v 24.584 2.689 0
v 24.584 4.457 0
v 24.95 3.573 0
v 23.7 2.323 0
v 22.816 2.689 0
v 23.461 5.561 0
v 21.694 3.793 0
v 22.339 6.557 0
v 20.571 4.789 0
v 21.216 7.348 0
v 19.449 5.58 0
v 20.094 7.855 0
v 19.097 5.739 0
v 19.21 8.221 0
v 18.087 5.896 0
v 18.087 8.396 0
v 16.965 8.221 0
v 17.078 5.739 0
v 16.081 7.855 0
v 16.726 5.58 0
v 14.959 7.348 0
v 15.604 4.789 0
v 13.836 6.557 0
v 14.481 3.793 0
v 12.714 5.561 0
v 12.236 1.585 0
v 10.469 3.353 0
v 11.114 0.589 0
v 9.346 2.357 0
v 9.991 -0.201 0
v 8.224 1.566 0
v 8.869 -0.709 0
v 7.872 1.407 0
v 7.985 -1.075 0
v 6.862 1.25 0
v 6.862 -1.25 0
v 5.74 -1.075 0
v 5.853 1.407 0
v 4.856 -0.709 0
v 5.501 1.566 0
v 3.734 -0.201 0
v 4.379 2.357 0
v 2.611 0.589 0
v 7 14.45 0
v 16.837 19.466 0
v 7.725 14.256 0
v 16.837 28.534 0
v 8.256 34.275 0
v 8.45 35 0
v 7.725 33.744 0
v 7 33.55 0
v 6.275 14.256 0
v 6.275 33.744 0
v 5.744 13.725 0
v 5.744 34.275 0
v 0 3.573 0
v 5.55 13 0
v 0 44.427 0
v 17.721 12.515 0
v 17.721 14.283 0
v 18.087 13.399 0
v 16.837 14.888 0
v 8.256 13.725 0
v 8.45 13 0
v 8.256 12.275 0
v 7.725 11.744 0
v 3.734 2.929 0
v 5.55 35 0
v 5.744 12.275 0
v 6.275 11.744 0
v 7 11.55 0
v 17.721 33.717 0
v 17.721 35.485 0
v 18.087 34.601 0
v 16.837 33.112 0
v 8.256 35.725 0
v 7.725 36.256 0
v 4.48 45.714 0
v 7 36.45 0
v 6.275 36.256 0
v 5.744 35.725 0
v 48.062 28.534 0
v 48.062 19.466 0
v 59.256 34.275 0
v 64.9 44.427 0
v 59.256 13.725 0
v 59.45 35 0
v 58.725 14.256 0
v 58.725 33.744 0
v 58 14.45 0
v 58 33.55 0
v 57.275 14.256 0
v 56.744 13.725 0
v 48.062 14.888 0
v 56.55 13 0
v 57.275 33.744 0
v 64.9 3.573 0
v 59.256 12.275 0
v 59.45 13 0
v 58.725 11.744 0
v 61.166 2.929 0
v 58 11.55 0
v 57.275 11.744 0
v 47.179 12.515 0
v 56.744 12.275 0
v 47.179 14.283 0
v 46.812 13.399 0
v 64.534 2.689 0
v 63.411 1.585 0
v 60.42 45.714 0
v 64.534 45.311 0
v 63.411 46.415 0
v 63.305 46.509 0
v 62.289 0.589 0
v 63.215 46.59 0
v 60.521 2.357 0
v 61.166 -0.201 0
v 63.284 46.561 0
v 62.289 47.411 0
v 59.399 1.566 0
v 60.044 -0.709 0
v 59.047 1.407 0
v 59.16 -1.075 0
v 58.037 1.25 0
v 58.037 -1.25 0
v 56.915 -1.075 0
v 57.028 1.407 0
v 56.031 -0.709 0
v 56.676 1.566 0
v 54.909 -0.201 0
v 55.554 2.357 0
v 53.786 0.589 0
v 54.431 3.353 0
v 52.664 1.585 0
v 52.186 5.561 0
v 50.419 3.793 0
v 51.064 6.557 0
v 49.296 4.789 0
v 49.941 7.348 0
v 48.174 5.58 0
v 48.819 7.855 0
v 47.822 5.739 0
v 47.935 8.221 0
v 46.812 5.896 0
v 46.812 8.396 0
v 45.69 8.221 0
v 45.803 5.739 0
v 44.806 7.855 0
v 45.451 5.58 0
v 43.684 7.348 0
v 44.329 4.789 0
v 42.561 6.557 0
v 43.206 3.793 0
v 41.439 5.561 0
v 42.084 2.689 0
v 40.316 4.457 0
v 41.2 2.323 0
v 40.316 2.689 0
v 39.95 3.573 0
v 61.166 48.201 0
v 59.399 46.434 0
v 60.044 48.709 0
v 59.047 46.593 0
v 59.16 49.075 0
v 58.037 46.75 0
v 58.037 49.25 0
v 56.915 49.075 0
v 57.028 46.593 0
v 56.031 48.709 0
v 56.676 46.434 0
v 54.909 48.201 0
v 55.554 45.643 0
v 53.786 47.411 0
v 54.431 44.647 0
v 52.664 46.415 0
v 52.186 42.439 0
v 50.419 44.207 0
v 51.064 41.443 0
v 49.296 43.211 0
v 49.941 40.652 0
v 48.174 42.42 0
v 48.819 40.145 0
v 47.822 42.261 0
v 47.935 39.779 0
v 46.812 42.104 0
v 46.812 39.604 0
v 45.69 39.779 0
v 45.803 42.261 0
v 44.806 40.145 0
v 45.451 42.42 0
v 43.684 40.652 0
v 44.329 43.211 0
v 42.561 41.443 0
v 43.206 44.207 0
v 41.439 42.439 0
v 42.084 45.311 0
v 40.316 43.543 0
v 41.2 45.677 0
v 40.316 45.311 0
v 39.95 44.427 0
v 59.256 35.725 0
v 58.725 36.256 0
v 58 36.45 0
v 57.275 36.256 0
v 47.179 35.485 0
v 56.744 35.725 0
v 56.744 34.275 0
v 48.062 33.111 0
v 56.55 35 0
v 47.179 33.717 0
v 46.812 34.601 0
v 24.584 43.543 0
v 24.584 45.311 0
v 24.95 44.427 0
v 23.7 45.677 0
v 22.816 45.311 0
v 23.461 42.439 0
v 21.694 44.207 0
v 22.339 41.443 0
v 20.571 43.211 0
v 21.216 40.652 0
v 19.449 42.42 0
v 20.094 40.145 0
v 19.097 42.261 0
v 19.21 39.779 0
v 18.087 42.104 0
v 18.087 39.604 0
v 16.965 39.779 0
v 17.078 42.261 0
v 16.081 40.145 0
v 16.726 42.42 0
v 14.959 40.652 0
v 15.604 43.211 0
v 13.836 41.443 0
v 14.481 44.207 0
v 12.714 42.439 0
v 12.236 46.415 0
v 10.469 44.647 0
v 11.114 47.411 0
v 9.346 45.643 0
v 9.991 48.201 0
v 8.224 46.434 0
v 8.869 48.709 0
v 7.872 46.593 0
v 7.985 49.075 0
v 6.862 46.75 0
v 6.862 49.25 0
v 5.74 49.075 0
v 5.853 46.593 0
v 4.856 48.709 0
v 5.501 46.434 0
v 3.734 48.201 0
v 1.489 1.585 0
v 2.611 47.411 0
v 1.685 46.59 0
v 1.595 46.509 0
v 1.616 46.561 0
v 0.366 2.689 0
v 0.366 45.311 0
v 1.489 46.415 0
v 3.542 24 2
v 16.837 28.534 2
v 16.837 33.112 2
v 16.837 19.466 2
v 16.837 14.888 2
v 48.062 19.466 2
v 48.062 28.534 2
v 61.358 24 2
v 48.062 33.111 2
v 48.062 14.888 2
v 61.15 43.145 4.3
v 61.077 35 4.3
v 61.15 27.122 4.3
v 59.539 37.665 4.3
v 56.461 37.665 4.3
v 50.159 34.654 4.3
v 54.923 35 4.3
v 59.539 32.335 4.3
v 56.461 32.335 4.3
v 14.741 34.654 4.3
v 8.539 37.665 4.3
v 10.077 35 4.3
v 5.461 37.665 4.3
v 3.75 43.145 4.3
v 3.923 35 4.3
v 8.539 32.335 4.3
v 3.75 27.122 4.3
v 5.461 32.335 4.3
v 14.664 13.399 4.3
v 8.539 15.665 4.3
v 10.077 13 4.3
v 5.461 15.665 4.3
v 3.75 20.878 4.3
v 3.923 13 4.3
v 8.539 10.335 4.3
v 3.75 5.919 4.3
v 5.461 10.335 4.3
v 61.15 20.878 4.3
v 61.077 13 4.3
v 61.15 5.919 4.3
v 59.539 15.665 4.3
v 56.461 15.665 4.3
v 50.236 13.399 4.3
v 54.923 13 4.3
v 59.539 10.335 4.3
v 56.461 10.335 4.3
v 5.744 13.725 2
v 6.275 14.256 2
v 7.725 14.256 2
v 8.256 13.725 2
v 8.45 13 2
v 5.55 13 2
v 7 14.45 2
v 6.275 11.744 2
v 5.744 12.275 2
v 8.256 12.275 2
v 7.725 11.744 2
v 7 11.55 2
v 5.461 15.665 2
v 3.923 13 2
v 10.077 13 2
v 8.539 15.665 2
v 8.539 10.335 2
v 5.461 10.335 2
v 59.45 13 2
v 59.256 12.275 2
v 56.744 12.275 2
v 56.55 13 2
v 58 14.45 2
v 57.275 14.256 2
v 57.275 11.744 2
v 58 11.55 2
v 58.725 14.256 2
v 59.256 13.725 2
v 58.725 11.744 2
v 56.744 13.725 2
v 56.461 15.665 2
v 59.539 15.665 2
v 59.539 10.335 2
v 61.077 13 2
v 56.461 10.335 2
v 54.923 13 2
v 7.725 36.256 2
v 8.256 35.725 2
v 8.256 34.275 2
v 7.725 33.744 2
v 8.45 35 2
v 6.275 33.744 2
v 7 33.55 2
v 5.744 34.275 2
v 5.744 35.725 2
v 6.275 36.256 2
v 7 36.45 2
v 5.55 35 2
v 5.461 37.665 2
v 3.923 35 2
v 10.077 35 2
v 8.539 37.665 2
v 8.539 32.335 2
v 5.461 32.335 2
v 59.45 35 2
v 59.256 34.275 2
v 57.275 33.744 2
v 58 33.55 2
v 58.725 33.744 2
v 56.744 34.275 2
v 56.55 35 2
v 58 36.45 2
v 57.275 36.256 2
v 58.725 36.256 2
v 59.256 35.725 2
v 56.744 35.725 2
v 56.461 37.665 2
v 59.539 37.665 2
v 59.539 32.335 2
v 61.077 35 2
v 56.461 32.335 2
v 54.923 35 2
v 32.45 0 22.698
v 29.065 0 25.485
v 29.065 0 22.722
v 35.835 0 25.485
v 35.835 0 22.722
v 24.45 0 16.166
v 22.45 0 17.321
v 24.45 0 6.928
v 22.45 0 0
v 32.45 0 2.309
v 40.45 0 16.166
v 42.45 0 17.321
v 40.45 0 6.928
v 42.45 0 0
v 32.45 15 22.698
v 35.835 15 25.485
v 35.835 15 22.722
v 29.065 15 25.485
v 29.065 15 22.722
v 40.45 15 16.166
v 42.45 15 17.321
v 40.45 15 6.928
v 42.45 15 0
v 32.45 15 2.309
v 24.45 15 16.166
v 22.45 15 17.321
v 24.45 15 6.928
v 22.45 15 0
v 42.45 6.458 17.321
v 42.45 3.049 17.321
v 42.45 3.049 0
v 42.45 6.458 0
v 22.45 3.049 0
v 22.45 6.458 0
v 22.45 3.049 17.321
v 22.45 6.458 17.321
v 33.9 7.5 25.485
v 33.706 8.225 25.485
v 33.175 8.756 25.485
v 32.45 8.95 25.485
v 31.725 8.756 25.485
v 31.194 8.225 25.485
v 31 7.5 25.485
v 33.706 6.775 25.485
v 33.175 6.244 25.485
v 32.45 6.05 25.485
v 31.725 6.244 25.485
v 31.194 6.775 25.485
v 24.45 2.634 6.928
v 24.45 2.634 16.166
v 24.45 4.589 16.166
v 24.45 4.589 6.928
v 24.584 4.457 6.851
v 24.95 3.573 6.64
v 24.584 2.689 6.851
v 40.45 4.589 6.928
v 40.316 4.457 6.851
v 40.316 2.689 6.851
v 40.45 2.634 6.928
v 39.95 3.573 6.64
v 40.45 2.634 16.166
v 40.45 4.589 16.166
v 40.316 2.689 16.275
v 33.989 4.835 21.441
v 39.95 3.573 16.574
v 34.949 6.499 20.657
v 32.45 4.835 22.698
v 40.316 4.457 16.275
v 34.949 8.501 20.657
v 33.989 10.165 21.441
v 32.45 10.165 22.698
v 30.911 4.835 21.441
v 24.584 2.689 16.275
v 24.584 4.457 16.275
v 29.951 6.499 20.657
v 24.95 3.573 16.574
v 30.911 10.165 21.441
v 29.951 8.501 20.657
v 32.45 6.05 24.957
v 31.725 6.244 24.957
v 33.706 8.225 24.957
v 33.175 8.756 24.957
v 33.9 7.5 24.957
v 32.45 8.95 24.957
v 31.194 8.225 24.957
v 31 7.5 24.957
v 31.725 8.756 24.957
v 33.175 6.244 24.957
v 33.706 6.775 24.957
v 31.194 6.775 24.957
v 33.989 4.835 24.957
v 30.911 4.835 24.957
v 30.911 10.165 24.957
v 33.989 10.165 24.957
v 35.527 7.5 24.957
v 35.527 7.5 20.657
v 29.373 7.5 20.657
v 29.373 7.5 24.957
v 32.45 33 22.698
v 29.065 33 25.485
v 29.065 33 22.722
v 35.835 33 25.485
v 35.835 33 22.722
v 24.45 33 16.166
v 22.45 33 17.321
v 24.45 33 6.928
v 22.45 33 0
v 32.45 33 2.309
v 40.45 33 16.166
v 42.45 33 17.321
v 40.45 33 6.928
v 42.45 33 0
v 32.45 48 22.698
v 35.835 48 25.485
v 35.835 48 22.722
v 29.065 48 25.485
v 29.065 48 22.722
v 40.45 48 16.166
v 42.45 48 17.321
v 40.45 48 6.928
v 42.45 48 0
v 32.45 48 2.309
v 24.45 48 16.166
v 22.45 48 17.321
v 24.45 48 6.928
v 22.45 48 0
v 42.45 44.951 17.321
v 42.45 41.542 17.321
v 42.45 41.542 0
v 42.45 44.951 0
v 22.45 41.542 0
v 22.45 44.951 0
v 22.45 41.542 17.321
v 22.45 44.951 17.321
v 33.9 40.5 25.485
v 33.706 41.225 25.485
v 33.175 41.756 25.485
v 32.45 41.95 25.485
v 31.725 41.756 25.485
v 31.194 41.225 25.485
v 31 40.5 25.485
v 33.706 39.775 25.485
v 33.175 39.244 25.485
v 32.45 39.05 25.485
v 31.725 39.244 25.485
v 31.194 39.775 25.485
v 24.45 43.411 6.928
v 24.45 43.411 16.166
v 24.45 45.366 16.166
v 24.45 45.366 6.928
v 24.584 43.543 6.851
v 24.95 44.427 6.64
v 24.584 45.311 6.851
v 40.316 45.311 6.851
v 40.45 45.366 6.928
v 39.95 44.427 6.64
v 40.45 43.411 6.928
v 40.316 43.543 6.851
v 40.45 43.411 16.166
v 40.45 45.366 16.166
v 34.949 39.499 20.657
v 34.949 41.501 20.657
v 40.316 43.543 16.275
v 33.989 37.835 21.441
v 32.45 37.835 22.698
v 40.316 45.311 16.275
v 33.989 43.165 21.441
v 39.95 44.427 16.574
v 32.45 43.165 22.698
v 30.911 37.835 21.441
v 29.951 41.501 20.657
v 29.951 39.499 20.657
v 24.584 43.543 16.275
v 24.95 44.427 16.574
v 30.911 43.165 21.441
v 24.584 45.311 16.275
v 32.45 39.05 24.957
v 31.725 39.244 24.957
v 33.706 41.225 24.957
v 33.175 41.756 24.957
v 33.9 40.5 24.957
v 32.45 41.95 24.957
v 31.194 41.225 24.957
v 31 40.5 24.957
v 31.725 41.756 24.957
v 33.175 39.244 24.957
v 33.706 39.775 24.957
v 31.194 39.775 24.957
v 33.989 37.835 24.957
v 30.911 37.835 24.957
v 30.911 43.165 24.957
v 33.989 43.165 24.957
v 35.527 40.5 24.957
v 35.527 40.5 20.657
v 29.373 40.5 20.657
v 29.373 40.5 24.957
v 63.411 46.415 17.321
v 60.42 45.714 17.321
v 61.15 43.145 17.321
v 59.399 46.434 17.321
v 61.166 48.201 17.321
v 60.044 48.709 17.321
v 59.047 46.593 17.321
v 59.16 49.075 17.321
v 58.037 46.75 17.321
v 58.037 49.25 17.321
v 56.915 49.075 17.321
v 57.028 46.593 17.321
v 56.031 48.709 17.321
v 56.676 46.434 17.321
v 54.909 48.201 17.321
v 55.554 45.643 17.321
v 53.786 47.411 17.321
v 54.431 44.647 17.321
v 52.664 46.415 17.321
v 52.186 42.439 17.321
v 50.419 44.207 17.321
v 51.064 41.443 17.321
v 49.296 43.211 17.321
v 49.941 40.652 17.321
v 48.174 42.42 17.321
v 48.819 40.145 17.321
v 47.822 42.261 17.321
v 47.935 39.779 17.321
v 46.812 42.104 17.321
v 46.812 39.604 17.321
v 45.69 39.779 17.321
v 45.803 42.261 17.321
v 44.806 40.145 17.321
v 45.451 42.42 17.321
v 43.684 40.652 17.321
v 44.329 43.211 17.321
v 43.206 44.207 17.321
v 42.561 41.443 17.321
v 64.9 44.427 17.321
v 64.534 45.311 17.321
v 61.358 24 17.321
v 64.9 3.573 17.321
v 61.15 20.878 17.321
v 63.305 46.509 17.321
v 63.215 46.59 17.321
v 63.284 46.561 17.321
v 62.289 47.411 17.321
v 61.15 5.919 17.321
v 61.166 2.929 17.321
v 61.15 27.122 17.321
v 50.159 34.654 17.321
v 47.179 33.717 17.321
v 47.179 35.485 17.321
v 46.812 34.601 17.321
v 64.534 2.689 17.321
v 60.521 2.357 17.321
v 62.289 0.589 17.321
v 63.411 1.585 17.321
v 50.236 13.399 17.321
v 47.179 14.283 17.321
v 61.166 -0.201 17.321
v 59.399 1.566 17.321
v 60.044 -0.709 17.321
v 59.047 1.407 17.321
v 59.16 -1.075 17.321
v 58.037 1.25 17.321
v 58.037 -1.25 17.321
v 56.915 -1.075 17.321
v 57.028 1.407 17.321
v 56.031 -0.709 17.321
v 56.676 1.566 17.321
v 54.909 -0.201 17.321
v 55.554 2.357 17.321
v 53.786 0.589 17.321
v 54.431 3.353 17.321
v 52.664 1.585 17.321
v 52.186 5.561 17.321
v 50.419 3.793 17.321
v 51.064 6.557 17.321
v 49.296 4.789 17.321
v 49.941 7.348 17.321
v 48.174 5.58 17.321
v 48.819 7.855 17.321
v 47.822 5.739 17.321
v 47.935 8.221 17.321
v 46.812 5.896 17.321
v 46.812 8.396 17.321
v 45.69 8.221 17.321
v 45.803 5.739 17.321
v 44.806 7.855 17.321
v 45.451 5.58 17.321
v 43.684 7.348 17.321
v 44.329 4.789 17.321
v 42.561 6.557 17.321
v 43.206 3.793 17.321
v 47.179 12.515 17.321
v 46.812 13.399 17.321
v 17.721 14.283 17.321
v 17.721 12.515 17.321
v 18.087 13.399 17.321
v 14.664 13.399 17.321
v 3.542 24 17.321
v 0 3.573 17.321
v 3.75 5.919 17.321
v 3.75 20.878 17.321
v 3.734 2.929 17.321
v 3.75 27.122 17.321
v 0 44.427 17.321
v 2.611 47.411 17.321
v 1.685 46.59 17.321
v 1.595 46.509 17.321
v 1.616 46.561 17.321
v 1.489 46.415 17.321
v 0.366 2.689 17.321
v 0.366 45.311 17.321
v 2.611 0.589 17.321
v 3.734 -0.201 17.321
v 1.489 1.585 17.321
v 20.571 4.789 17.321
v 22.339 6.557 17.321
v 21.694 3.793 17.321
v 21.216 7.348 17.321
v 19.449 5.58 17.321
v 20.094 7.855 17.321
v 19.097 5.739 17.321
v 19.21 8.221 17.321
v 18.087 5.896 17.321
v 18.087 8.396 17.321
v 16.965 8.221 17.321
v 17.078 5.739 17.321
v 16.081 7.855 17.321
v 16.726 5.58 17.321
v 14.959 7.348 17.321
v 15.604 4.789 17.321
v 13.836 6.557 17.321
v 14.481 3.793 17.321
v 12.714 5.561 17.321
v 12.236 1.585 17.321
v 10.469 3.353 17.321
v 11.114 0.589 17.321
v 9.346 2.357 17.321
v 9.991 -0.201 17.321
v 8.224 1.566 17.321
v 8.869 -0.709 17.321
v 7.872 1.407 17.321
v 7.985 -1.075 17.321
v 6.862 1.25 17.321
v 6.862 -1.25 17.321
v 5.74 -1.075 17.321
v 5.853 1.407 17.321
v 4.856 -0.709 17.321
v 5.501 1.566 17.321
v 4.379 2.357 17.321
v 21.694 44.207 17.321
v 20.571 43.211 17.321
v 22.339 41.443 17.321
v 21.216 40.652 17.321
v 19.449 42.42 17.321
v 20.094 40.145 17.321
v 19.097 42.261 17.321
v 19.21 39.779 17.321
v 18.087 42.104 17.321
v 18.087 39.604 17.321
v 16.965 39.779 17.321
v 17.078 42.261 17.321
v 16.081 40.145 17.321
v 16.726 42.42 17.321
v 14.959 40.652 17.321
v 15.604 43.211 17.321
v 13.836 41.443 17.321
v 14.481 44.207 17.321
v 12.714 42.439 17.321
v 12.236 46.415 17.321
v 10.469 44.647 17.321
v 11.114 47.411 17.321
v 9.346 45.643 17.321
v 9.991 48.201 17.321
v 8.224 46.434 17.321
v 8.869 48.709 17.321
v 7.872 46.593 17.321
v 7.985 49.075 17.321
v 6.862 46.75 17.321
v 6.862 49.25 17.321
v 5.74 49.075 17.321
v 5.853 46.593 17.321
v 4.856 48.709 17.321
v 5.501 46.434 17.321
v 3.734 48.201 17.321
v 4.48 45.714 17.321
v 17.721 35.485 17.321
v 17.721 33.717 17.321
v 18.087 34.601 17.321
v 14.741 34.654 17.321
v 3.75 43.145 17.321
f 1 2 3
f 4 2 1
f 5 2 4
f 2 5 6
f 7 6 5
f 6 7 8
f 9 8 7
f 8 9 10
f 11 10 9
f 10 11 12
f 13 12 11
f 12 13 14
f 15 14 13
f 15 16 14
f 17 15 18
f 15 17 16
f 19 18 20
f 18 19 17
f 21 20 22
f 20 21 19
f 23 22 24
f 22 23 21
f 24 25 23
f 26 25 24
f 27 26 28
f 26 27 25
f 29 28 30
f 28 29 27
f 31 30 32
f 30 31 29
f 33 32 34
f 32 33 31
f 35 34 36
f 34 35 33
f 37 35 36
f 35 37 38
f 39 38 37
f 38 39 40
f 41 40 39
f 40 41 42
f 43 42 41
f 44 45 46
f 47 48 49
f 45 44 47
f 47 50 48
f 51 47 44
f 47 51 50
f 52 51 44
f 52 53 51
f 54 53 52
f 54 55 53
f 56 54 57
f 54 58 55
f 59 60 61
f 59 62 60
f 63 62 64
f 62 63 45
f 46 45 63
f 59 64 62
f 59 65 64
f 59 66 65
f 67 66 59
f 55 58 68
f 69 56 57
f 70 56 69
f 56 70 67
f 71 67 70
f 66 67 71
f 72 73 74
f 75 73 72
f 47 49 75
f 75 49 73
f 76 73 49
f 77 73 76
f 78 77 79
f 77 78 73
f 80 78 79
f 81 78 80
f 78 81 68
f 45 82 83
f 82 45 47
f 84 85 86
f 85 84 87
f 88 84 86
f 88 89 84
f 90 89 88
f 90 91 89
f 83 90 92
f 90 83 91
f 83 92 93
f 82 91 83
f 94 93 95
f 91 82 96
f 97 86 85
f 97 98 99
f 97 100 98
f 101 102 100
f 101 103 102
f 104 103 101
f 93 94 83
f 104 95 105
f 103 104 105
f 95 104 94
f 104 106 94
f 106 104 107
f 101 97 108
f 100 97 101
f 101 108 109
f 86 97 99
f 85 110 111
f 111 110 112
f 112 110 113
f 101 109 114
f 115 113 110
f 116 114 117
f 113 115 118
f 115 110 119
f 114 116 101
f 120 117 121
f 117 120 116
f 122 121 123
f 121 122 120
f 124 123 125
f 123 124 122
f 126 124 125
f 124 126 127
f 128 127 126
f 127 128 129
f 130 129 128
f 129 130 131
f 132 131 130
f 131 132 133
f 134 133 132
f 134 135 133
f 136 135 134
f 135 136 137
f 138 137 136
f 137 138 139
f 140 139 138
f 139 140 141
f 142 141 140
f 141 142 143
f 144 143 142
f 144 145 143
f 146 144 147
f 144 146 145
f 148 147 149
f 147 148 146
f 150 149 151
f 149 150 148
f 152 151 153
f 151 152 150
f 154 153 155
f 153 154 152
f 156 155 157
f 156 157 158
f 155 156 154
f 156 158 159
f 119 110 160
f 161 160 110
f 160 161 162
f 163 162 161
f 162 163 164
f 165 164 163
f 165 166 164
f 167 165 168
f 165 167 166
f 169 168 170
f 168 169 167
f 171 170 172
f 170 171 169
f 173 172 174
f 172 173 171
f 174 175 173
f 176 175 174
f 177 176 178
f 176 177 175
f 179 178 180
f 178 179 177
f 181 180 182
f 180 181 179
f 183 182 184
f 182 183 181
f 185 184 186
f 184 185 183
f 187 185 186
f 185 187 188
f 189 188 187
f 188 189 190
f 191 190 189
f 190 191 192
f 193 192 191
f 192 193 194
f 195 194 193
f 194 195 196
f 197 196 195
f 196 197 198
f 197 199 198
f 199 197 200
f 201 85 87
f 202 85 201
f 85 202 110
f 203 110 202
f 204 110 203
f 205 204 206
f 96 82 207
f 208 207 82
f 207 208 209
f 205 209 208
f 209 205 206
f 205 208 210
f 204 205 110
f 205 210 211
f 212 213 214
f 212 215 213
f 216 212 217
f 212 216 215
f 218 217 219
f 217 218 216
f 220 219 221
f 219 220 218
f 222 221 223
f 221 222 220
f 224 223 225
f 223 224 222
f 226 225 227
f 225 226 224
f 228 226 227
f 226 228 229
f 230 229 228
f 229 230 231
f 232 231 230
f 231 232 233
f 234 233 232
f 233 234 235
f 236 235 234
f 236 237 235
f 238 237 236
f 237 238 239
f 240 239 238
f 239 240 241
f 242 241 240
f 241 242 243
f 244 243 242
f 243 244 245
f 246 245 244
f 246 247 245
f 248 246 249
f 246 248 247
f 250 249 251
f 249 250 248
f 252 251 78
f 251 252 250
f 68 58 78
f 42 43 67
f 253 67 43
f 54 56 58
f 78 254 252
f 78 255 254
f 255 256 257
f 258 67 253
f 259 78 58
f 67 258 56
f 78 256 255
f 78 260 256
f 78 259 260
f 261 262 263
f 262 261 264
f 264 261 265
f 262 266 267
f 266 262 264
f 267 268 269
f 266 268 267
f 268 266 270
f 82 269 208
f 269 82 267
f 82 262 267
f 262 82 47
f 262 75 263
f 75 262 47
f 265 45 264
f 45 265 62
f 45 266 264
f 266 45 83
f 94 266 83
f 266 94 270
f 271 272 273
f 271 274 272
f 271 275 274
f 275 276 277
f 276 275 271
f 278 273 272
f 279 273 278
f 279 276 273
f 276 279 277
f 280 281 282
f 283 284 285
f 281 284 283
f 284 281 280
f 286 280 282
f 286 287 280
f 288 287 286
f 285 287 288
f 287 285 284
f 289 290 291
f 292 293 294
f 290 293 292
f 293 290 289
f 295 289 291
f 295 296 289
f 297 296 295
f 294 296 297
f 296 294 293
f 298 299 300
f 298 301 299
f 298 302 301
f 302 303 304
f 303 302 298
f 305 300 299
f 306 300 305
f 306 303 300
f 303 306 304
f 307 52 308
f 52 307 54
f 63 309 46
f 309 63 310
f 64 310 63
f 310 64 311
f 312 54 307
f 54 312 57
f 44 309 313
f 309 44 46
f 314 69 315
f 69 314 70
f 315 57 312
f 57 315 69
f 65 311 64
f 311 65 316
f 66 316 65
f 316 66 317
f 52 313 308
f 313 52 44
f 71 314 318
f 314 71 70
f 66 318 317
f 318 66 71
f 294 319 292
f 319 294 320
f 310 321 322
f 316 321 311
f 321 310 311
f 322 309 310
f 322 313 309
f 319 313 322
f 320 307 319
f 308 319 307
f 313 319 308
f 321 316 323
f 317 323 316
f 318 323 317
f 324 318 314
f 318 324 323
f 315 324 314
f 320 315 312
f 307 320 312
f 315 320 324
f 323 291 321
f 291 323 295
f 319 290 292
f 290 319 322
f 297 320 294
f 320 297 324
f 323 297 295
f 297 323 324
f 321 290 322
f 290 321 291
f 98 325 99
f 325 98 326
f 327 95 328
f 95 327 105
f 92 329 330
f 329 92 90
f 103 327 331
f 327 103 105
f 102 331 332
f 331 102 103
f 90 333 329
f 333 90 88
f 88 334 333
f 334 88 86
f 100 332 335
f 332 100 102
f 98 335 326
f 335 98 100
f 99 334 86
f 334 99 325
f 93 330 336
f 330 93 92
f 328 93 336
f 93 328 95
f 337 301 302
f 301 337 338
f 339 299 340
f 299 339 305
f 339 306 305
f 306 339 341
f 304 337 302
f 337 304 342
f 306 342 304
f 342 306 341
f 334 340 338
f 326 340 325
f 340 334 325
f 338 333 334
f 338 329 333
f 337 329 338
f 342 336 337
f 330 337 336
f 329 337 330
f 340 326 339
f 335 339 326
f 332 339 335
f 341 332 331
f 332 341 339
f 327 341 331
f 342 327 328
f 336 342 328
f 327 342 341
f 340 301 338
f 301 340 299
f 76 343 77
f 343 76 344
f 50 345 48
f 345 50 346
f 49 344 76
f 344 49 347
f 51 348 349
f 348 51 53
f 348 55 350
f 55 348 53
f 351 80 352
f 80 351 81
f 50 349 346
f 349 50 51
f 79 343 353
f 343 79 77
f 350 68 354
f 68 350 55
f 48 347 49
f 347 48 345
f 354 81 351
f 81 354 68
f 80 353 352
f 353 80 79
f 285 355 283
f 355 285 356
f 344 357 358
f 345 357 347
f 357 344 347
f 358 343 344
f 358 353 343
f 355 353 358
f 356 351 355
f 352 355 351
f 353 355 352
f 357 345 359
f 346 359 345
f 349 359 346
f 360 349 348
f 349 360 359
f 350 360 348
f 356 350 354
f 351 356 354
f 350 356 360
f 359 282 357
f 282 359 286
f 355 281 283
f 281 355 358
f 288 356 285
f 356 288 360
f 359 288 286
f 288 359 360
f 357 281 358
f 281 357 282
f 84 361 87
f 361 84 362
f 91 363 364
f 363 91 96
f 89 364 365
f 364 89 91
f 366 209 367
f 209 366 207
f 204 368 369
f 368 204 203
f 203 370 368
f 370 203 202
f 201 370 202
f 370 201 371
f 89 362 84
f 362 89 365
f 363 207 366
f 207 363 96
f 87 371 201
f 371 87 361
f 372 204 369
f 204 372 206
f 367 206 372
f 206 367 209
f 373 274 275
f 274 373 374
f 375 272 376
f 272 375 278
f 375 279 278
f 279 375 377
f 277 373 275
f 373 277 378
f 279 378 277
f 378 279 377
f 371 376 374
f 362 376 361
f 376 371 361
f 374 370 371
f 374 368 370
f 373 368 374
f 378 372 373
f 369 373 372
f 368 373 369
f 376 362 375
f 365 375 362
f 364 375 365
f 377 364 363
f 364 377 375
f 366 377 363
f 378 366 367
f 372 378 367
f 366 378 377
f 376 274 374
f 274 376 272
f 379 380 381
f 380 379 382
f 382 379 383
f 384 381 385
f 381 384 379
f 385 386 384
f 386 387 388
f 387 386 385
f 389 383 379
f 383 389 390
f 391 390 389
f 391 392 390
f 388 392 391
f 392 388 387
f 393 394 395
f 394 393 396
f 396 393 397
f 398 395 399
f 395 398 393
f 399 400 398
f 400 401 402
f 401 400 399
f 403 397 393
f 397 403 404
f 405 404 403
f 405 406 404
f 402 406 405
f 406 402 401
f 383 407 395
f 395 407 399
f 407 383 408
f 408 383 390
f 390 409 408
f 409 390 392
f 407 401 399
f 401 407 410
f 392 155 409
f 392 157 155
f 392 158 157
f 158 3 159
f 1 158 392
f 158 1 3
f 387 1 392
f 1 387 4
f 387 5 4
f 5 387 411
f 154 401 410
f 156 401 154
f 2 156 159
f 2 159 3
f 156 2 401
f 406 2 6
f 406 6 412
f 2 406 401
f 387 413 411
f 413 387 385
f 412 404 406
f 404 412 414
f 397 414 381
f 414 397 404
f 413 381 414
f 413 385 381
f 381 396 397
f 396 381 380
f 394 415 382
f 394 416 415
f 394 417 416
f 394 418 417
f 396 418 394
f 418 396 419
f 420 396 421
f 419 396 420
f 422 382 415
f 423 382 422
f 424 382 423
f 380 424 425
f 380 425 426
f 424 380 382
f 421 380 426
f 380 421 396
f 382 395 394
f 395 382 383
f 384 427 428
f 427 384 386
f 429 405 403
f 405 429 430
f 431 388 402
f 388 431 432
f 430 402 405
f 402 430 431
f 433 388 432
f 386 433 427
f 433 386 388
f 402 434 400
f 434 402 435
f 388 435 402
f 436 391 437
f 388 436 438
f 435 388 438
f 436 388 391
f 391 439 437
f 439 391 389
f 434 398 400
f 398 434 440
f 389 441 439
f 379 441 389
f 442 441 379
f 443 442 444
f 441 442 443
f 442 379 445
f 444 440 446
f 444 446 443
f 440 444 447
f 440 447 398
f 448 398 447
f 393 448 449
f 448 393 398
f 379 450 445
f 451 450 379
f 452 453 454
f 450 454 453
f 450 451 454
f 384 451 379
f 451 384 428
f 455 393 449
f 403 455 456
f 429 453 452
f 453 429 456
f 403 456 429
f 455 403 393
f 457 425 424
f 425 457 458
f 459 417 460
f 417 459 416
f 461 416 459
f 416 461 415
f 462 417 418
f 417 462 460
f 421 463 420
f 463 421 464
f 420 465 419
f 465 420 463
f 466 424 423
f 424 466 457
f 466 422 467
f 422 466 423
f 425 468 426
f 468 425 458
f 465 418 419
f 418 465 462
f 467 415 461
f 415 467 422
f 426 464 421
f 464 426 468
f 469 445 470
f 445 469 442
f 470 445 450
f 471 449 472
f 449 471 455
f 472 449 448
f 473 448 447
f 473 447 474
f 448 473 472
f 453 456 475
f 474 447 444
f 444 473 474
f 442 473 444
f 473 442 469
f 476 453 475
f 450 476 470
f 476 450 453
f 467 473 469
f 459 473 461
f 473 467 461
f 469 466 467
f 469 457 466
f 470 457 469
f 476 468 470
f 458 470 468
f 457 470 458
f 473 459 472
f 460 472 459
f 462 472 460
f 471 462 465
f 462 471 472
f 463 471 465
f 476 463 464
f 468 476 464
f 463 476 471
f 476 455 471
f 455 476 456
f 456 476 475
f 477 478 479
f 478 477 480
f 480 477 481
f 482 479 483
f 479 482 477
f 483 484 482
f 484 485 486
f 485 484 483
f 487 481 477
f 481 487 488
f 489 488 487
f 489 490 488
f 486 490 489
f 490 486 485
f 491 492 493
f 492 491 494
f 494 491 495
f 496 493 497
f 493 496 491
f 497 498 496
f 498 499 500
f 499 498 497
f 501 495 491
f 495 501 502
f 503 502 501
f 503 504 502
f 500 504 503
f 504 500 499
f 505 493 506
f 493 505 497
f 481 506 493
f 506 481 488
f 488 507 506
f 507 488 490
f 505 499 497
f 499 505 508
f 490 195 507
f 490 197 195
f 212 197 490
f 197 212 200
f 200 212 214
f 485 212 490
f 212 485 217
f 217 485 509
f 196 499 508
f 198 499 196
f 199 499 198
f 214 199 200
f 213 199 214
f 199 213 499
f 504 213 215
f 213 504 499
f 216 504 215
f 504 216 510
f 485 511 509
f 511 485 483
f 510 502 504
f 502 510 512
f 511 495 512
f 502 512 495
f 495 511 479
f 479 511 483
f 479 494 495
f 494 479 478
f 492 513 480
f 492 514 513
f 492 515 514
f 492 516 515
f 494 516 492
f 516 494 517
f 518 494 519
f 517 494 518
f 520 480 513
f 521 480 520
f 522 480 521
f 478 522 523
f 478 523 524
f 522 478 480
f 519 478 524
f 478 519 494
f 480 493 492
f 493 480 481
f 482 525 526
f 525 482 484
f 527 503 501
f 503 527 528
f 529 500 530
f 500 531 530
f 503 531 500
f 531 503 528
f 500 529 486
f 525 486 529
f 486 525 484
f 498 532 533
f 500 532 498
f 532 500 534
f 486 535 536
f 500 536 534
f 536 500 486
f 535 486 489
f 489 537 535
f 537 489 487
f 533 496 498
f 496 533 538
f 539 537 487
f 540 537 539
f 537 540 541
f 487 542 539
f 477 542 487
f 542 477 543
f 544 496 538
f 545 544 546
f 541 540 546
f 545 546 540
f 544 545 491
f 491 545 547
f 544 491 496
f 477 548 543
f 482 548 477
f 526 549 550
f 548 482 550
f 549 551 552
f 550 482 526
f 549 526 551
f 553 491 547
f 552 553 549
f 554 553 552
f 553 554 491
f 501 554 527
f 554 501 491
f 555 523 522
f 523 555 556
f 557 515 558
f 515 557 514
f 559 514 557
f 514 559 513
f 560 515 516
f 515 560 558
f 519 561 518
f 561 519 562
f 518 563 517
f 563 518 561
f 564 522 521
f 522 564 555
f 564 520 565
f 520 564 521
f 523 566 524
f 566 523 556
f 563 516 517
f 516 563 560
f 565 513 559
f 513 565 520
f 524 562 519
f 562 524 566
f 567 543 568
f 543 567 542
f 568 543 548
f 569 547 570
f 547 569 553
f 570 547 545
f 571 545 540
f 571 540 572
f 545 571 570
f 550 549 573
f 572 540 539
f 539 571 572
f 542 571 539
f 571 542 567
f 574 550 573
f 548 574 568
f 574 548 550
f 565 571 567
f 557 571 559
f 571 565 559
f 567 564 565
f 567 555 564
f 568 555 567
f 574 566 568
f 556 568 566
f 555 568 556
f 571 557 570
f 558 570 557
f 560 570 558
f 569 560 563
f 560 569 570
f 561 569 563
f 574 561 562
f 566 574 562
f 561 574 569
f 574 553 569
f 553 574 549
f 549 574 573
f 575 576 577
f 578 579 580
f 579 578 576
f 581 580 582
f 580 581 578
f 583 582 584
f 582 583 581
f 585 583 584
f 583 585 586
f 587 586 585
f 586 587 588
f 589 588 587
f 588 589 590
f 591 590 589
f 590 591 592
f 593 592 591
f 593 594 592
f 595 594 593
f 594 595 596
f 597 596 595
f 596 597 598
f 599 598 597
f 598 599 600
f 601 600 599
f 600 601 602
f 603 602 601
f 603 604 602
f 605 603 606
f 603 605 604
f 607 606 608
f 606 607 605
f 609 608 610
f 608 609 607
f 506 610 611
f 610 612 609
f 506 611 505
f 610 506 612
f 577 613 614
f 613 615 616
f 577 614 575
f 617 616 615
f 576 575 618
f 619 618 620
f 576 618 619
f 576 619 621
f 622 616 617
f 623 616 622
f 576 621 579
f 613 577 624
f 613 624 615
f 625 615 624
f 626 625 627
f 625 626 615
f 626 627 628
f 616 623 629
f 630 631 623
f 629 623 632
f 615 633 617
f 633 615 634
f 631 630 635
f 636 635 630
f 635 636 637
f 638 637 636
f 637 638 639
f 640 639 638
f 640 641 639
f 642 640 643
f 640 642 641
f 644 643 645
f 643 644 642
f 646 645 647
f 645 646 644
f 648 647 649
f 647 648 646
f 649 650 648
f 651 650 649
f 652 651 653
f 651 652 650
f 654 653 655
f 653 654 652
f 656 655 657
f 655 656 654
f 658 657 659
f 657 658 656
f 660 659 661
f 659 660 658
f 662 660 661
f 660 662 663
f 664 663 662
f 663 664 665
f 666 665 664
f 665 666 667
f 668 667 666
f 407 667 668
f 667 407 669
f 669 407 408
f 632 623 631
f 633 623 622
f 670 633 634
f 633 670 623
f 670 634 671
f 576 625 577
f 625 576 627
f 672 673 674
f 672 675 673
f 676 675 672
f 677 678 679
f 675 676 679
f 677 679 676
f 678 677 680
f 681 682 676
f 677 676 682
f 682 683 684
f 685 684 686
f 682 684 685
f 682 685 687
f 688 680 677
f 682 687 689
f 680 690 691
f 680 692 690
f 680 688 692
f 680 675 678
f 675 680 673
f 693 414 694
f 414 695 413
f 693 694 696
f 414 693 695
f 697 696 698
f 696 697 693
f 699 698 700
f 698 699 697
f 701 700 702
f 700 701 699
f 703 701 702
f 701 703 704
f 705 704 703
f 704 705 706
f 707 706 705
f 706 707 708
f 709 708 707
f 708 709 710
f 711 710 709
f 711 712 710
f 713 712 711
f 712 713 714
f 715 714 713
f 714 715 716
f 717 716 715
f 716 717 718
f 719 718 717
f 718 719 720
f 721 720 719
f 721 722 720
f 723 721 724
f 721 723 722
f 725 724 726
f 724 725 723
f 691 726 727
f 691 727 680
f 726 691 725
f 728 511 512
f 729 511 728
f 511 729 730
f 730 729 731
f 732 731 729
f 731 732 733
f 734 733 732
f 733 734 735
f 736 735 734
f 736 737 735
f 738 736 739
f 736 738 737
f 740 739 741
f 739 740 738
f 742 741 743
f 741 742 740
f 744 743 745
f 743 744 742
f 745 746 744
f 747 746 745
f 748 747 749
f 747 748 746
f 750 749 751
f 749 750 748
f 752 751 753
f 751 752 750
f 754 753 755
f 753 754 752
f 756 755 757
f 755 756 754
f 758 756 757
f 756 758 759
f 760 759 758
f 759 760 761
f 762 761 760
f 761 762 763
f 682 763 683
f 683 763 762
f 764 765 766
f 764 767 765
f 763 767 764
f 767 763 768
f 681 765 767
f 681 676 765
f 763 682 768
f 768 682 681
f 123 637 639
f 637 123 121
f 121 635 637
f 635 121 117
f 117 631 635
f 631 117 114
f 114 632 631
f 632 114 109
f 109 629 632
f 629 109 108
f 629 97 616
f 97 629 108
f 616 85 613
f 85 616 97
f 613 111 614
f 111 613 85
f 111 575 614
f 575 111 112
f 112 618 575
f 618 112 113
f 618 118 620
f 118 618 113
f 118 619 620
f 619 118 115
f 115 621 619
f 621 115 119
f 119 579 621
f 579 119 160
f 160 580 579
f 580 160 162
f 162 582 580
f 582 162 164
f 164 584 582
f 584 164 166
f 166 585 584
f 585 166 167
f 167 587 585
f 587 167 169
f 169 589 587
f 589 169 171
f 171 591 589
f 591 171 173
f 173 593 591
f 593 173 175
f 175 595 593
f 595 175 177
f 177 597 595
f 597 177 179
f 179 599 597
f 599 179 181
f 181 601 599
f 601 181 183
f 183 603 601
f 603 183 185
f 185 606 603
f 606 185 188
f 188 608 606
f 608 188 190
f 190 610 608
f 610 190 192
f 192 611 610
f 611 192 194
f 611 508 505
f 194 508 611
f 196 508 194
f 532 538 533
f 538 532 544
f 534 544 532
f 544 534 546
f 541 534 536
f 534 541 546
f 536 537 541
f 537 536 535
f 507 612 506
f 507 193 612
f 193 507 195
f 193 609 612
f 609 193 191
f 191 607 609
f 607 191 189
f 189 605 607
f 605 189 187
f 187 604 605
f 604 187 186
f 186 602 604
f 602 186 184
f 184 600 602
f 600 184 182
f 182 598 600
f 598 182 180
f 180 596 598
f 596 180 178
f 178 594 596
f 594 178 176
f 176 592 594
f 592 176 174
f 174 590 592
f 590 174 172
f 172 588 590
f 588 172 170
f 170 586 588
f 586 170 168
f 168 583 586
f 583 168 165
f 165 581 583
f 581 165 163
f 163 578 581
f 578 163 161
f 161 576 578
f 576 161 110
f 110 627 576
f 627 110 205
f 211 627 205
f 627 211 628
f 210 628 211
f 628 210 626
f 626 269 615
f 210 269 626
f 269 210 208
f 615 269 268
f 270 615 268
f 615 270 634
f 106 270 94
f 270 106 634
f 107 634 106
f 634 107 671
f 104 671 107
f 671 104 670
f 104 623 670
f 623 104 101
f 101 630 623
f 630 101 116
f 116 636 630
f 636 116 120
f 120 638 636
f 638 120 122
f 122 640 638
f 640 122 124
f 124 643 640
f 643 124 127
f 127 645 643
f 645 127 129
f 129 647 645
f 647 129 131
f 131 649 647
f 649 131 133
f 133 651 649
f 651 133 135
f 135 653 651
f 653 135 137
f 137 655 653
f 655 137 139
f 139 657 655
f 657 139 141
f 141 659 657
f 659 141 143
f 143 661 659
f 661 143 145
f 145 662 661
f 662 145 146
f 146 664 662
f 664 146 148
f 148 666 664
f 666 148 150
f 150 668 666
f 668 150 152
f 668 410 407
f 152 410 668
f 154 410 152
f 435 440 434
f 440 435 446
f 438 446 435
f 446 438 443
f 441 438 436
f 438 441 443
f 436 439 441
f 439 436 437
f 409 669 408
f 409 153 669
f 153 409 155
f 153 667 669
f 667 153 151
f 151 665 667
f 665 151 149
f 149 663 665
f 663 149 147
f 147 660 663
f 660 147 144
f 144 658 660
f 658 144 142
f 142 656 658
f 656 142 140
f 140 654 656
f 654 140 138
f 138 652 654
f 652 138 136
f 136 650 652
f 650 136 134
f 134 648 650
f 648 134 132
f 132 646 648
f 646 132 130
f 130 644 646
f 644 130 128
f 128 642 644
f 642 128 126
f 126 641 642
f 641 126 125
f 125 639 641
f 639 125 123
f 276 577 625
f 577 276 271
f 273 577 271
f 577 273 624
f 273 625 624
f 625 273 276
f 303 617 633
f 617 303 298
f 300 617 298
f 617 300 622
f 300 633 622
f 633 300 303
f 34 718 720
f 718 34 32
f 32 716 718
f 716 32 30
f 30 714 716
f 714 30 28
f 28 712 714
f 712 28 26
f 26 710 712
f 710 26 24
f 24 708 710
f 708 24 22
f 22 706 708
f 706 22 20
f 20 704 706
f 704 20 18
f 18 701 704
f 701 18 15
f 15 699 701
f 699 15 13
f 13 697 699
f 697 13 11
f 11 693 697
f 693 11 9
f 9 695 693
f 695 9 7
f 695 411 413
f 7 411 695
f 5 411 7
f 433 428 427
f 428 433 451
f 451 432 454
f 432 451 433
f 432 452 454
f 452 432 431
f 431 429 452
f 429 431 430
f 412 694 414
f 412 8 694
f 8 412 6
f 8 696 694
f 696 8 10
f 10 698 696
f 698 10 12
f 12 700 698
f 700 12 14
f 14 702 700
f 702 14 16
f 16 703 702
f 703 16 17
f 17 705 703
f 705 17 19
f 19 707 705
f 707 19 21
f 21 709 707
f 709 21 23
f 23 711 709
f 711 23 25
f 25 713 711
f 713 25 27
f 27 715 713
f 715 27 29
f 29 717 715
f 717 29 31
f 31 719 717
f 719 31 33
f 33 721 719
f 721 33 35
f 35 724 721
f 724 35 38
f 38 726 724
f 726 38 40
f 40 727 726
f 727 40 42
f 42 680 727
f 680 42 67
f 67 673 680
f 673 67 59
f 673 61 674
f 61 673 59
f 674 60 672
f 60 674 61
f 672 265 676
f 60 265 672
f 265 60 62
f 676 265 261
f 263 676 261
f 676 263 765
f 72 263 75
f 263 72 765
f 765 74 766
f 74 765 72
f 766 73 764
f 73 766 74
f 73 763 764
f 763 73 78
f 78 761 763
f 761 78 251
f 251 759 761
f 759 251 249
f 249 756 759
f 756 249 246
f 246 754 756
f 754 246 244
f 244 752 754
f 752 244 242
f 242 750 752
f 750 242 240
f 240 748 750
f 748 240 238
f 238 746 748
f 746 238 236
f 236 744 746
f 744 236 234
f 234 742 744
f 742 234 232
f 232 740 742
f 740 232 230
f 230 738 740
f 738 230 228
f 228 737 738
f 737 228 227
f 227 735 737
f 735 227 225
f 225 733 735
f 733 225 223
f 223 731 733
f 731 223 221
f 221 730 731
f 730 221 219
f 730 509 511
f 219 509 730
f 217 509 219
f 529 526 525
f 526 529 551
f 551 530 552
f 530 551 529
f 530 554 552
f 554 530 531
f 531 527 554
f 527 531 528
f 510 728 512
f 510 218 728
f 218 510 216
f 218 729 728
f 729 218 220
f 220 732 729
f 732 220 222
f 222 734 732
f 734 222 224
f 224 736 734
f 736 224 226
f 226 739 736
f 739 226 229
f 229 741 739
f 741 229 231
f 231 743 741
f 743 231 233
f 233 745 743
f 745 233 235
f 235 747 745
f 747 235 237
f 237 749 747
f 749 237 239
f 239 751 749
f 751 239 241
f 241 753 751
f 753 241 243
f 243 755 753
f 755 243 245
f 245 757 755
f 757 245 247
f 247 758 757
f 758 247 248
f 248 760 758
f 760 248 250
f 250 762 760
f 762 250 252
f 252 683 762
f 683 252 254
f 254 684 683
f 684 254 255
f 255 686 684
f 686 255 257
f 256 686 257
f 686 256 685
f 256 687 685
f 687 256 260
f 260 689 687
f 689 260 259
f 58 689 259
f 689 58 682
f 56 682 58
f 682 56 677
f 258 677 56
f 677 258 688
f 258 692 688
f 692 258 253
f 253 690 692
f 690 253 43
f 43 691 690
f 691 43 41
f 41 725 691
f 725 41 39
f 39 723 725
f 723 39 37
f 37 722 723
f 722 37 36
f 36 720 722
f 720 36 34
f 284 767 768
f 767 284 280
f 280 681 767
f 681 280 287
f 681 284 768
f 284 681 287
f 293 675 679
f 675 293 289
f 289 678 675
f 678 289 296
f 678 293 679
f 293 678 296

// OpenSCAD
// file: ribbon.scad
module rotateToPath(path, index, closed=false) {
    function getAngle(v) = atan2(v[1],v[0])-90;

    if (index == len(path)-1 && ! closed) {
        rotate([0,0,getAngle(path[index]-path[index-1])]) children();
    }
    else {
        nextIndex = (index == len(path)-1) ? 0 : index + 1;
        rotate([0,0,getAngle(path[nextIndex]-path[index])]) children();
    }
}

module ribbon(points, thickness=1, closed=false, rotate=false) {
    p = closed ? concat(points, [points[0]]) : points;
    
    union() {
        for (i=[1:len(p)-1]) {
            hull() {
                translate(p[i-1]) 
                    if ($children==0)
                        circle(d=thickness, $fn=8);
                    else if (!rotate)
                        children();
                    else 
                        rotateToPath(points,i==0 ? len(points)-1 : i-1,closed=closed) children();
                translate(p[i]) 
                    if ($children==0)
                        circle(d=thickness, $fn=8);
                    else if (!rotate)
                        children();
                    else 
                        rotateToPath(points, i==len(points) ? 0 : i,closed=closed) children();
            }
        }
    }
}

pi = 3.1415926535897932;
function SIN(theta) = sin(theta * 180 / pi);
function COS(theta) = cos(theta * 180 / pi);
function TAN(theta) = tan(theta * 180 / pi);

//<skip>
color("red") linear_extrude(height=10)
 ribbon([for (theta=[0:0.1:2*pi]) [theta * 10 / (2*pi), SIN(theta) * 10 / (2*pi)]], thickness=2, closed=true);
color("blue") linear_extrude(height=10)
 ribbon([for (theta=[0:0.1:2*pi]) [theta * 10 / (2*pi), SIN(theta) * 10 / (2*pi)]], thickness=.1, closed=true);
ribbon([for (theta=[0:0.1:2*pi+.1]) [COS(theta)*10, SIN(3*theta) * 10]], thickness=.5);


translate([0,0,20]) ribbon([for (theta=[0:0.2:2*pi+.1]) [COS(theta)*10, SIN(theta) * 10]], rotate=true, closed=true) intersection() {
    sphere(r=2,$fn=16);
    translate([2,0,0]) cube([4,0.01,4],center=true);
    }
    

//</skip>
    
// main file
use <ribbon.scad>;

pi = 3.141592653589793;
width = 64.9;
height = 48;
edge_thickness = 3;
spring_thickness = 2.5;
base_thickness = 2;

tool_holder_thickness = 2;
tool_holder_inner_diameter = 16;
tool_holder_height = 15;

// M3
pen_screw_hole_diameter = 2.9;
pen_screw_nut_thickness = 2.3;
pen_screw_nut_width = 5.33;

//
base_screw_hole_diameter = 2.9;
base_screw_nut_thickness = 2.3;
base_screw_nut_width = 5.33;

triangle_thickness = base_screw_nut_thickness+base_thickness;

tool_screw_head_area = pen_screw_nut_width * 2 / sqrt(3)*1.1;

tool_holder_width = tool_holder_inner_diameter+tool_holder_thickness*2;

clearance_factor = 1.75;

h2 = tool_holder_inner_diameter + 2 * tool_holder_thickness;
spring_width = h2 / sqrt(3)*1.5;

wavelength = (width - tool_holder_width)/2;

amplitude = wavelength / (2*pi);
dh = (2+clearance_factor)*amplitude;

nudge = 0.001;

module spring(wavelength, amplitude, thickness=spring_thickness, spring_points=20) {
    ribbon([for(i=[0:spring_points]) [wavelength*i/spring_points, amplitude*SIN(i*2*pi/spring_points)]], thickness=thickness);       
}

triangles = [
[[spring_thickness,amplitude],[wavelength*.75, dh], [spring_thickness, 2*dh-amplitude]],
[[width-spring_thickness,amplitude],[width-wavelength*.75, dh], [width-spring_thickness, 2*dh-amplitude]],
[[spring_thickness,height-amplitude+spring_thickness/2],[wavelength*.75, height-dh], [spring_thickness,height-( 2*dh-amplitude)]],
[[width-spring_thickness,height-amplitude+spring_thickness/2],[width-wavelength*.75, height-dh], [width-spring_thickness, height-(2*dh-amplitude)]]
];

function sumTo(v,n) = n<0 ? [for (i=[0:len(v[0])]) 0] : v[n]+sumTo(v,n-1);
function sum(v,n) = sumTo(v,len(v)-1);
function center(points) = sum(points)/len(points);

triangleCenters0 = [for (i=[0:len(triangles)-1]) center(triangles[i])];
triangleCenters = [for (i=[0:len(triangles)-1]) [for (j=[0:1]) round(triangleCenters0[i][j])]];
echo("triangle centers", triangleCenters);

module ribbon_base() {
    translate([spring_thickness/2,amplitude]) {
        spring(wavelength, -amplitude);
        translate([width - wavelength-spring_thickness,0]) spring(wavelength, amplitude);
    }

    translate([spring_thickness/2,height-amplitude,0]) {
        spring(wavelength, amplitude);
        translate([width - wavelength-spring_thickness,0]) spring(wavelength, -amplitude);
    }
    
    for (i=[0:3]) ribbon(triangles[i], closed=true, thickness=spring_thickness);

    polygon([[0,amplitude], [edge_thickness,amplitude-edge_thickness*.75], [edge_thickness,height-amplitude+edge_thickness*.75], [0,height-amplitude]]);
    
    polygon([[width,amplitude], [width-edge_thickness,amplitude-edge_thickness*.75], [width-edge_thickness,height-amplitude+edge_thickness*.75], [width,height-amplitude]]);
}

module base() {
    bottom = [[spring_thickness/2,height/2+nudge],[spring_thickness/2,amplitude],[wavelength*.75,dh],[wavelength*.75,tool_holder_height+1.25*amplitude],
    [width-wavelength*.75,tool_holder_height+1.25*amplitude],
    [width-wavelength*.75,dh],[width-spring_thickness/2,amplitude],[width-spring_thickness/2,height/2+nudge]];
    
    top = [for (i=[0:len(bottom)-1]) [width,height]-bottom[i]];
    
    union() {
        polygon(bottom);
        polygon(top);
    }
}

module stretched_hexagon(h) {
    r = h / sqrt(3);
    points = [for(i=[0:5]) i == 4 ? [0,-r/2-r/2*sqrt(2)] : [r*cos(30+60*i),r*sin(30+60*i)]];
    polygon(points=points);
 }
 
 module outer_hexagon(h) {
    r = h / sqrt(3);
    points = [for(i=[0:5]) i == 4 ? [0,-r/2-r/2*sqrt(2)] : [r*cos(30+60*i),(i==0 || i==2) ? r : r*sin(30+60*i)]];
    polygon(points=points);
    translate([-tool_screw_head_area/2, -r/2-r/2*sqrt(2)]) 
    square([tool_screw_head_area,tool_holder_thickness*sqrt(2)]);
}
 
 module tool_holder() {
     h2 = tool_holder_inner_diameter+2*tool_holder_thickness;
     translate([width/2,0,0])
     rotate([-90,0,0])
     linear_extrude(height=tool_holder_height)
     translate([0, -h2  / sqrt(3)])
     render(convexity=2)
     difference() {
         outer_hexagon(h2);
         stretched_hexagon(tool_holder_inner_diameter);
     }
 }

module base_holes() {
    render(convexity=10)
    union() {
        for (i=[0:len(triangleCenters)-1]) {
         translate(0,0,-nudge) linear_extrude(height=10+triangle_thickness+2*nudge) translate(triangleCenters[i]) circle(d=base_screw_hole_diameter, $fn=12);
            translate([0,0,triangle_thickness-base_screw_nut_thickness])
         linear_extrude(height=base_screw_nut_thickness+nudge) translate(triangleCenters[i]) circle(d=base_screw_nut_width*2/sqrt(3), $fn=6);
    }
}
}
 
 module tool_holder_with_holes() {
     h2 = tool_holder_inner_diameter+2*tool_holder_thickness;
     
     topZ = h2 / sqrt(3) * (1 + 1/2 + sqrt(2)/2 );

    render(convexity=10)
     difference() {
         tool_holder();
         
         translate([width/2,tool_holder_height/2,topZ-tool_holder_thickness*2]) cylinder(d=pen_screw_hole_diameter, h=tool_holder_thickness*2, $fn=12);
         translate([width/2,tool_holder_height/2,topZ-tool_holder_thickness*sqrt(2)-tool_holder_thickness]) cylinder(d=(pen_screw_nut_width*2/sqrt(3)), h=pen_screw_nut_thickness+tool_holder_thickness, $fn=6);
         }
     }
 
module full_holder() {
    linear_extrude(height=spring_width) ribbon_base();
    difference() {
        union() {
            linear_extrude(height=base_thickness) base();
            linear_extrude(height=triangle_thickness) {
                for(i=[0:3]) polygon(triangles[i]);
             }
         }
         base_holes();
     }
     
     tool_holder_with_holes();
     translate([0,height-tool_holder_height,0]) tool_holder_with_holes();
}
 
// projection(cut=true)
// translate([0,0,-10])
 full_holder();
 //base_holes();
